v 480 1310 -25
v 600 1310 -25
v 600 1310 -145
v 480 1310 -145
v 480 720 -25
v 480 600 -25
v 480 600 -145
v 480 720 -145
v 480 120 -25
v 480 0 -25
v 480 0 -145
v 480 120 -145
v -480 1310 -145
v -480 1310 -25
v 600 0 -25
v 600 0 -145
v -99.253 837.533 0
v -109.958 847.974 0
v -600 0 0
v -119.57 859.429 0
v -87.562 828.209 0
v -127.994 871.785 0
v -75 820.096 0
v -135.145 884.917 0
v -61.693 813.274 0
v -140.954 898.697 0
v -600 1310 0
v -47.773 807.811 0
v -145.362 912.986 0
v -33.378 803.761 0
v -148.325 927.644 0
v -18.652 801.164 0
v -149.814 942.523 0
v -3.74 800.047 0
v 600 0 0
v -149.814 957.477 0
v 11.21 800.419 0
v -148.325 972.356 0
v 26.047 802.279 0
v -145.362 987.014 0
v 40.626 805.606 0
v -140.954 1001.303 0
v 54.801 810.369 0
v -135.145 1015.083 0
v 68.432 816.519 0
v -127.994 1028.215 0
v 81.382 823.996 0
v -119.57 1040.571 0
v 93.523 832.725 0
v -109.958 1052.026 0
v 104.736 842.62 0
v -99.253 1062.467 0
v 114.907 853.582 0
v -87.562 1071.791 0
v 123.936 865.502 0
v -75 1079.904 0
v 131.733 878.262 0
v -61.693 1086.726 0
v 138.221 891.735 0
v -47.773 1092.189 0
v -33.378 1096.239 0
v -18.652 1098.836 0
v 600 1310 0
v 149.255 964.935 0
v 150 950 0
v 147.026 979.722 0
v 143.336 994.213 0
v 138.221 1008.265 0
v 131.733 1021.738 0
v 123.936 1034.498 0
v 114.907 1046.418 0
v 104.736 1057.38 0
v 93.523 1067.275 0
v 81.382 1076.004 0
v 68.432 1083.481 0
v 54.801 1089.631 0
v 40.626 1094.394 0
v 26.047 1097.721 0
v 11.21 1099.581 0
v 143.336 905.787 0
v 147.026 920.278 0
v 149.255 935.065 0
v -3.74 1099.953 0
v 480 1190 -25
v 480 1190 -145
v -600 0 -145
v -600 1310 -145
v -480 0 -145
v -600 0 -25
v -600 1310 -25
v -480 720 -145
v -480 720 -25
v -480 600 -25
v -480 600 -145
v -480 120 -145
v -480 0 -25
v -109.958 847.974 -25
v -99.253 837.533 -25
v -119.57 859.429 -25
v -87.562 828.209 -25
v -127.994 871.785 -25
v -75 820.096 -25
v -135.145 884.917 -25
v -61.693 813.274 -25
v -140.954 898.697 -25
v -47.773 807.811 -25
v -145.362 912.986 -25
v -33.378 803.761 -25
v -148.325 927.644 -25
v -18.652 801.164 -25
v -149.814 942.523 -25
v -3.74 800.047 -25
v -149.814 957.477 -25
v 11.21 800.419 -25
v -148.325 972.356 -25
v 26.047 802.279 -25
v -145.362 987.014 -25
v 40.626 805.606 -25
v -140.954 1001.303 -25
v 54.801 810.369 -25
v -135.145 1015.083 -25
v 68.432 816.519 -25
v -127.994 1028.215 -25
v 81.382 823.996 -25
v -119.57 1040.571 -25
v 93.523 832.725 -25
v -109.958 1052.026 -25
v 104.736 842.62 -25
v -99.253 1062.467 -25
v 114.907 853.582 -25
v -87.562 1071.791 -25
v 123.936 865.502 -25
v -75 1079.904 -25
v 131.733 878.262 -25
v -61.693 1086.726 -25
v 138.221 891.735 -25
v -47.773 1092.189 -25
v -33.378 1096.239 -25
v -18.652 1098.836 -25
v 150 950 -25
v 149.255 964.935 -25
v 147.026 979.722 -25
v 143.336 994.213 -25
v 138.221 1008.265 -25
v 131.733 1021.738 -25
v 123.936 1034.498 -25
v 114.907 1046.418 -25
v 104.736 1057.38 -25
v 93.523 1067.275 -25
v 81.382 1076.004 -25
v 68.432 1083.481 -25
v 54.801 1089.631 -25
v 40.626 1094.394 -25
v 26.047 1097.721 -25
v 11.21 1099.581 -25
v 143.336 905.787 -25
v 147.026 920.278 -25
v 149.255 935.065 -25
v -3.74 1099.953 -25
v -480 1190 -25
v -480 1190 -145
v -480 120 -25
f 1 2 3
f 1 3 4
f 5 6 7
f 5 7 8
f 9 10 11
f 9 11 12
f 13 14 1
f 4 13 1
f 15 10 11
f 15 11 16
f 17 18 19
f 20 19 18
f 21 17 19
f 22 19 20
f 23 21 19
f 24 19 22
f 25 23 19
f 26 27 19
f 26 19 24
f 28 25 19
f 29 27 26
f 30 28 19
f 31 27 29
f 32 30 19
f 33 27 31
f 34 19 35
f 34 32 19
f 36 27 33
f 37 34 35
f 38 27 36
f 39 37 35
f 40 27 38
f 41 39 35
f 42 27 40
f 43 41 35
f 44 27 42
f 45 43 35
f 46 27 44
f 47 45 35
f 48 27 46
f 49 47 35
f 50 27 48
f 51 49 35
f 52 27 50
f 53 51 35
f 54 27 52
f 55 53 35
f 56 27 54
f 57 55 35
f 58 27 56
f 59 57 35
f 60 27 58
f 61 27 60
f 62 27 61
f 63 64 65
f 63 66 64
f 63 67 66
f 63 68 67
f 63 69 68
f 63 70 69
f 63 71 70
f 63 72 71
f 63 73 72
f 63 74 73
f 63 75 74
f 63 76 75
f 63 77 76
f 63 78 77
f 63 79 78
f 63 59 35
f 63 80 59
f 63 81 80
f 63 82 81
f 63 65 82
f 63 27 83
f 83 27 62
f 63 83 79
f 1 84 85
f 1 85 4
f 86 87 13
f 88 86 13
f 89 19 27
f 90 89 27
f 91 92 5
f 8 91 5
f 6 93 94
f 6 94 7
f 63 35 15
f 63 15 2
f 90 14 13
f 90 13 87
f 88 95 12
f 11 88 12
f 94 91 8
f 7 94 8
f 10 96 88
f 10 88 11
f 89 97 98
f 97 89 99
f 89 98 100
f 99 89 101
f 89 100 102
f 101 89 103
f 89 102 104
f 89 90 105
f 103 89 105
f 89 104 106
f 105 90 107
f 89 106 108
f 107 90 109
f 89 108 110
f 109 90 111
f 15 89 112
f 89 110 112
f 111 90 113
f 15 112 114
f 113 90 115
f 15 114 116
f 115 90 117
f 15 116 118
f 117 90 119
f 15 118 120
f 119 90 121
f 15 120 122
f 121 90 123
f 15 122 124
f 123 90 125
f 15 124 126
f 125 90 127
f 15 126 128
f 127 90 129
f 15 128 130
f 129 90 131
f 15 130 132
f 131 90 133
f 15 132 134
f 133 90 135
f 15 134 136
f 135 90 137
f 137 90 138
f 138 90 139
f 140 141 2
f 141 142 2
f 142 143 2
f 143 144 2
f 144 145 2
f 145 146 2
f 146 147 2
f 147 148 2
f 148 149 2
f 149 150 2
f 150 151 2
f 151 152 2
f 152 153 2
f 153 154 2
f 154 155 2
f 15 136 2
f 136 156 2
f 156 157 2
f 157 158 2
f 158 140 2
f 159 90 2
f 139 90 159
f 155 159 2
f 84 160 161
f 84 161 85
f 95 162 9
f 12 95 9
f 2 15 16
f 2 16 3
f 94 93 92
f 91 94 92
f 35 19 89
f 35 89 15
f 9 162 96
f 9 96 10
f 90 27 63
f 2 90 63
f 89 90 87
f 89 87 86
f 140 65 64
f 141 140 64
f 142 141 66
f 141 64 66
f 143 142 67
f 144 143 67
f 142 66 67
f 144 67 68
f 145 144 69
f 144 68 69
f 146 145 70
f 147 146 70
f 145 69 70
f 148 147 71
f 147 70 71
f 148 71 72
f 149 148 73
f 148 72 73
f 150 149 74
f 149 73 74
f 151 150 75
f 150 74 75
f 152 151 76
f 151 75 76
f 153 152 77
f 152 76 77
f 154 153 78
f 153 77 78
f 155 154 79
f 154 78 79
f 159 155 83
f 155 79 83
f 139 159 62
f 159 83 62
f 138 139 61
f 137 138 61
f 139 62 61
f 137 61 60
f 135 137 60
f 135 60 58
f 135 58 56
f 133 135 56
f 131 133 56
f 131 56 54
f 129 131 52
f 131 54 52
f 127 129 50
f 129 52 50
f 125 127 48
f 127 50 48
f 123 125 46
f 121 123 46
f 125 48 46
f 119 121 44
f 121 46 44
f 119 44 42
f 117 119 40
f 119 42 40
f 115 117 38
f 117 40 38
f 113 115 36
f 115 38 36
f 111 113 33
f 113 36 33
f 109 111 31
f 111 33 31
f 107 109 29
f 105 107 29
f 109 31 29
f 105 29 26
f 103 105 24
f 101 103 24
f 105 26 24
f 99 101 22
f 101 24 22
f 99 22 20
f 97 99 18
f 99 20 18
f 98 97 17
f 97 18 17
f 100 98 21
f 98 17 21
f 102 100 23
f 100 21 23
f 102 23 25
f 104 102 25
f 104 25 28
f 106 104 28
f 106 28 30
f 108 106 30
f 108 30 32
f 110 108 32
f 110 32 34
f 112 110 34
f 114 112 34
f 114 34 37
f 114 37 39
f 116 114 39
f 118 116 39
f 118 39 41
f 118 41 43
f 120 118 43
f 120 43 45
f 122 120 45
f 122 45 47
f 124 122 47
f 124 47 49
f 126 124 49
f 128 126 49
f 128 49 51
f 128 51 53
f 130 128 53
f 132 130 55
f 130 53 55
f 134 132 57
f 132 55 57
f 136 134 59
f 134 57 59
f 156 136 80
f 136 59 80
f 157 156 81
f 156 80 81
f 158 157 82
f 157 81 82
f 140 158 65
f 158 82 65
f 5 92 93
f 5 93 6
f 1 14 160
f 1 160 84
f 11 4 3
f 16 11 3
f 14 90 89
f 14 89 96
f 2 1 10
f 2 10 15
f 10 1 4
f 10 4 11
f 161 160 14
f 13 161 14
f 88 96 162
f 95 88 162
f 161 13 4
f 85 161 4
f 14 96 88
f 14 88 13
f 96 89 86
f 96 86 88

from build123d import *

# Parameters (mm, degrees)
F0_W     = 1200
F0_H     = 1310
F0_R     = 150
F1_DEPTH = 25
F3_W     = 960
F3_H     = 120
F4_DEPTH = 120
F5_DEPTH = 120
F6_DEPTH = 120


with BuildPart() as f1:
    # F0 (on Top) → F1 (new body)
    with BuildSketch(Plane.XY):
        with Locations((0, 655)):
            Rectangle(F0_W, F0_H)
        with Locations((0, 950)):
            Circle(F0_R, mode=Mode.SUBTRACT)
    extrude(amount=-F1_DEPTH)


with BuildPart() as f4:
    # F3 (on offset) → F4 (new body)
    with BuildSketch(Plane.XY.offset(-25)):
        with Locations((0, 1250)):
            Rectangle(F3_W, F3_H)
        with Locations((0, 60)):
            Rectangle(F3_W, F3_H)
    extrude(amount=-F4_DEPTH)


with BuildPart() as f5:
    # F3 (on offset) → F5 (new body)
    with BuildSketch(Plane.XY.offset(-25)):
        Polygon((-480, 1190), (-480, 1310), (-600, 1310), (-600, 1190), (-600, 120), (-600, 0), (-480, 0), (-480, 120), (-480, 600), (-480, 720), align=None)
        Polygon((600, 1190), (600, 1310), (480, 1310), (480, 1190), (480, 720), (480, 600), (480, 120), (480, 0), (600, 0), (600, 120), align=None)
    extrude(amount=-F5_DEPTH)


with BuildPart() as f6:
    # F3 (on offset) → F6 (new body)
    with BuildSketch(Plane.XY.offset(-25)):
        with Locations((0, 660)):
            Rectangle(F3_W, F3_H)
    extrude(amount=-F6_DEPTH)


solid = Compound([f1.part, f4.part, f5.part, f6.part])
